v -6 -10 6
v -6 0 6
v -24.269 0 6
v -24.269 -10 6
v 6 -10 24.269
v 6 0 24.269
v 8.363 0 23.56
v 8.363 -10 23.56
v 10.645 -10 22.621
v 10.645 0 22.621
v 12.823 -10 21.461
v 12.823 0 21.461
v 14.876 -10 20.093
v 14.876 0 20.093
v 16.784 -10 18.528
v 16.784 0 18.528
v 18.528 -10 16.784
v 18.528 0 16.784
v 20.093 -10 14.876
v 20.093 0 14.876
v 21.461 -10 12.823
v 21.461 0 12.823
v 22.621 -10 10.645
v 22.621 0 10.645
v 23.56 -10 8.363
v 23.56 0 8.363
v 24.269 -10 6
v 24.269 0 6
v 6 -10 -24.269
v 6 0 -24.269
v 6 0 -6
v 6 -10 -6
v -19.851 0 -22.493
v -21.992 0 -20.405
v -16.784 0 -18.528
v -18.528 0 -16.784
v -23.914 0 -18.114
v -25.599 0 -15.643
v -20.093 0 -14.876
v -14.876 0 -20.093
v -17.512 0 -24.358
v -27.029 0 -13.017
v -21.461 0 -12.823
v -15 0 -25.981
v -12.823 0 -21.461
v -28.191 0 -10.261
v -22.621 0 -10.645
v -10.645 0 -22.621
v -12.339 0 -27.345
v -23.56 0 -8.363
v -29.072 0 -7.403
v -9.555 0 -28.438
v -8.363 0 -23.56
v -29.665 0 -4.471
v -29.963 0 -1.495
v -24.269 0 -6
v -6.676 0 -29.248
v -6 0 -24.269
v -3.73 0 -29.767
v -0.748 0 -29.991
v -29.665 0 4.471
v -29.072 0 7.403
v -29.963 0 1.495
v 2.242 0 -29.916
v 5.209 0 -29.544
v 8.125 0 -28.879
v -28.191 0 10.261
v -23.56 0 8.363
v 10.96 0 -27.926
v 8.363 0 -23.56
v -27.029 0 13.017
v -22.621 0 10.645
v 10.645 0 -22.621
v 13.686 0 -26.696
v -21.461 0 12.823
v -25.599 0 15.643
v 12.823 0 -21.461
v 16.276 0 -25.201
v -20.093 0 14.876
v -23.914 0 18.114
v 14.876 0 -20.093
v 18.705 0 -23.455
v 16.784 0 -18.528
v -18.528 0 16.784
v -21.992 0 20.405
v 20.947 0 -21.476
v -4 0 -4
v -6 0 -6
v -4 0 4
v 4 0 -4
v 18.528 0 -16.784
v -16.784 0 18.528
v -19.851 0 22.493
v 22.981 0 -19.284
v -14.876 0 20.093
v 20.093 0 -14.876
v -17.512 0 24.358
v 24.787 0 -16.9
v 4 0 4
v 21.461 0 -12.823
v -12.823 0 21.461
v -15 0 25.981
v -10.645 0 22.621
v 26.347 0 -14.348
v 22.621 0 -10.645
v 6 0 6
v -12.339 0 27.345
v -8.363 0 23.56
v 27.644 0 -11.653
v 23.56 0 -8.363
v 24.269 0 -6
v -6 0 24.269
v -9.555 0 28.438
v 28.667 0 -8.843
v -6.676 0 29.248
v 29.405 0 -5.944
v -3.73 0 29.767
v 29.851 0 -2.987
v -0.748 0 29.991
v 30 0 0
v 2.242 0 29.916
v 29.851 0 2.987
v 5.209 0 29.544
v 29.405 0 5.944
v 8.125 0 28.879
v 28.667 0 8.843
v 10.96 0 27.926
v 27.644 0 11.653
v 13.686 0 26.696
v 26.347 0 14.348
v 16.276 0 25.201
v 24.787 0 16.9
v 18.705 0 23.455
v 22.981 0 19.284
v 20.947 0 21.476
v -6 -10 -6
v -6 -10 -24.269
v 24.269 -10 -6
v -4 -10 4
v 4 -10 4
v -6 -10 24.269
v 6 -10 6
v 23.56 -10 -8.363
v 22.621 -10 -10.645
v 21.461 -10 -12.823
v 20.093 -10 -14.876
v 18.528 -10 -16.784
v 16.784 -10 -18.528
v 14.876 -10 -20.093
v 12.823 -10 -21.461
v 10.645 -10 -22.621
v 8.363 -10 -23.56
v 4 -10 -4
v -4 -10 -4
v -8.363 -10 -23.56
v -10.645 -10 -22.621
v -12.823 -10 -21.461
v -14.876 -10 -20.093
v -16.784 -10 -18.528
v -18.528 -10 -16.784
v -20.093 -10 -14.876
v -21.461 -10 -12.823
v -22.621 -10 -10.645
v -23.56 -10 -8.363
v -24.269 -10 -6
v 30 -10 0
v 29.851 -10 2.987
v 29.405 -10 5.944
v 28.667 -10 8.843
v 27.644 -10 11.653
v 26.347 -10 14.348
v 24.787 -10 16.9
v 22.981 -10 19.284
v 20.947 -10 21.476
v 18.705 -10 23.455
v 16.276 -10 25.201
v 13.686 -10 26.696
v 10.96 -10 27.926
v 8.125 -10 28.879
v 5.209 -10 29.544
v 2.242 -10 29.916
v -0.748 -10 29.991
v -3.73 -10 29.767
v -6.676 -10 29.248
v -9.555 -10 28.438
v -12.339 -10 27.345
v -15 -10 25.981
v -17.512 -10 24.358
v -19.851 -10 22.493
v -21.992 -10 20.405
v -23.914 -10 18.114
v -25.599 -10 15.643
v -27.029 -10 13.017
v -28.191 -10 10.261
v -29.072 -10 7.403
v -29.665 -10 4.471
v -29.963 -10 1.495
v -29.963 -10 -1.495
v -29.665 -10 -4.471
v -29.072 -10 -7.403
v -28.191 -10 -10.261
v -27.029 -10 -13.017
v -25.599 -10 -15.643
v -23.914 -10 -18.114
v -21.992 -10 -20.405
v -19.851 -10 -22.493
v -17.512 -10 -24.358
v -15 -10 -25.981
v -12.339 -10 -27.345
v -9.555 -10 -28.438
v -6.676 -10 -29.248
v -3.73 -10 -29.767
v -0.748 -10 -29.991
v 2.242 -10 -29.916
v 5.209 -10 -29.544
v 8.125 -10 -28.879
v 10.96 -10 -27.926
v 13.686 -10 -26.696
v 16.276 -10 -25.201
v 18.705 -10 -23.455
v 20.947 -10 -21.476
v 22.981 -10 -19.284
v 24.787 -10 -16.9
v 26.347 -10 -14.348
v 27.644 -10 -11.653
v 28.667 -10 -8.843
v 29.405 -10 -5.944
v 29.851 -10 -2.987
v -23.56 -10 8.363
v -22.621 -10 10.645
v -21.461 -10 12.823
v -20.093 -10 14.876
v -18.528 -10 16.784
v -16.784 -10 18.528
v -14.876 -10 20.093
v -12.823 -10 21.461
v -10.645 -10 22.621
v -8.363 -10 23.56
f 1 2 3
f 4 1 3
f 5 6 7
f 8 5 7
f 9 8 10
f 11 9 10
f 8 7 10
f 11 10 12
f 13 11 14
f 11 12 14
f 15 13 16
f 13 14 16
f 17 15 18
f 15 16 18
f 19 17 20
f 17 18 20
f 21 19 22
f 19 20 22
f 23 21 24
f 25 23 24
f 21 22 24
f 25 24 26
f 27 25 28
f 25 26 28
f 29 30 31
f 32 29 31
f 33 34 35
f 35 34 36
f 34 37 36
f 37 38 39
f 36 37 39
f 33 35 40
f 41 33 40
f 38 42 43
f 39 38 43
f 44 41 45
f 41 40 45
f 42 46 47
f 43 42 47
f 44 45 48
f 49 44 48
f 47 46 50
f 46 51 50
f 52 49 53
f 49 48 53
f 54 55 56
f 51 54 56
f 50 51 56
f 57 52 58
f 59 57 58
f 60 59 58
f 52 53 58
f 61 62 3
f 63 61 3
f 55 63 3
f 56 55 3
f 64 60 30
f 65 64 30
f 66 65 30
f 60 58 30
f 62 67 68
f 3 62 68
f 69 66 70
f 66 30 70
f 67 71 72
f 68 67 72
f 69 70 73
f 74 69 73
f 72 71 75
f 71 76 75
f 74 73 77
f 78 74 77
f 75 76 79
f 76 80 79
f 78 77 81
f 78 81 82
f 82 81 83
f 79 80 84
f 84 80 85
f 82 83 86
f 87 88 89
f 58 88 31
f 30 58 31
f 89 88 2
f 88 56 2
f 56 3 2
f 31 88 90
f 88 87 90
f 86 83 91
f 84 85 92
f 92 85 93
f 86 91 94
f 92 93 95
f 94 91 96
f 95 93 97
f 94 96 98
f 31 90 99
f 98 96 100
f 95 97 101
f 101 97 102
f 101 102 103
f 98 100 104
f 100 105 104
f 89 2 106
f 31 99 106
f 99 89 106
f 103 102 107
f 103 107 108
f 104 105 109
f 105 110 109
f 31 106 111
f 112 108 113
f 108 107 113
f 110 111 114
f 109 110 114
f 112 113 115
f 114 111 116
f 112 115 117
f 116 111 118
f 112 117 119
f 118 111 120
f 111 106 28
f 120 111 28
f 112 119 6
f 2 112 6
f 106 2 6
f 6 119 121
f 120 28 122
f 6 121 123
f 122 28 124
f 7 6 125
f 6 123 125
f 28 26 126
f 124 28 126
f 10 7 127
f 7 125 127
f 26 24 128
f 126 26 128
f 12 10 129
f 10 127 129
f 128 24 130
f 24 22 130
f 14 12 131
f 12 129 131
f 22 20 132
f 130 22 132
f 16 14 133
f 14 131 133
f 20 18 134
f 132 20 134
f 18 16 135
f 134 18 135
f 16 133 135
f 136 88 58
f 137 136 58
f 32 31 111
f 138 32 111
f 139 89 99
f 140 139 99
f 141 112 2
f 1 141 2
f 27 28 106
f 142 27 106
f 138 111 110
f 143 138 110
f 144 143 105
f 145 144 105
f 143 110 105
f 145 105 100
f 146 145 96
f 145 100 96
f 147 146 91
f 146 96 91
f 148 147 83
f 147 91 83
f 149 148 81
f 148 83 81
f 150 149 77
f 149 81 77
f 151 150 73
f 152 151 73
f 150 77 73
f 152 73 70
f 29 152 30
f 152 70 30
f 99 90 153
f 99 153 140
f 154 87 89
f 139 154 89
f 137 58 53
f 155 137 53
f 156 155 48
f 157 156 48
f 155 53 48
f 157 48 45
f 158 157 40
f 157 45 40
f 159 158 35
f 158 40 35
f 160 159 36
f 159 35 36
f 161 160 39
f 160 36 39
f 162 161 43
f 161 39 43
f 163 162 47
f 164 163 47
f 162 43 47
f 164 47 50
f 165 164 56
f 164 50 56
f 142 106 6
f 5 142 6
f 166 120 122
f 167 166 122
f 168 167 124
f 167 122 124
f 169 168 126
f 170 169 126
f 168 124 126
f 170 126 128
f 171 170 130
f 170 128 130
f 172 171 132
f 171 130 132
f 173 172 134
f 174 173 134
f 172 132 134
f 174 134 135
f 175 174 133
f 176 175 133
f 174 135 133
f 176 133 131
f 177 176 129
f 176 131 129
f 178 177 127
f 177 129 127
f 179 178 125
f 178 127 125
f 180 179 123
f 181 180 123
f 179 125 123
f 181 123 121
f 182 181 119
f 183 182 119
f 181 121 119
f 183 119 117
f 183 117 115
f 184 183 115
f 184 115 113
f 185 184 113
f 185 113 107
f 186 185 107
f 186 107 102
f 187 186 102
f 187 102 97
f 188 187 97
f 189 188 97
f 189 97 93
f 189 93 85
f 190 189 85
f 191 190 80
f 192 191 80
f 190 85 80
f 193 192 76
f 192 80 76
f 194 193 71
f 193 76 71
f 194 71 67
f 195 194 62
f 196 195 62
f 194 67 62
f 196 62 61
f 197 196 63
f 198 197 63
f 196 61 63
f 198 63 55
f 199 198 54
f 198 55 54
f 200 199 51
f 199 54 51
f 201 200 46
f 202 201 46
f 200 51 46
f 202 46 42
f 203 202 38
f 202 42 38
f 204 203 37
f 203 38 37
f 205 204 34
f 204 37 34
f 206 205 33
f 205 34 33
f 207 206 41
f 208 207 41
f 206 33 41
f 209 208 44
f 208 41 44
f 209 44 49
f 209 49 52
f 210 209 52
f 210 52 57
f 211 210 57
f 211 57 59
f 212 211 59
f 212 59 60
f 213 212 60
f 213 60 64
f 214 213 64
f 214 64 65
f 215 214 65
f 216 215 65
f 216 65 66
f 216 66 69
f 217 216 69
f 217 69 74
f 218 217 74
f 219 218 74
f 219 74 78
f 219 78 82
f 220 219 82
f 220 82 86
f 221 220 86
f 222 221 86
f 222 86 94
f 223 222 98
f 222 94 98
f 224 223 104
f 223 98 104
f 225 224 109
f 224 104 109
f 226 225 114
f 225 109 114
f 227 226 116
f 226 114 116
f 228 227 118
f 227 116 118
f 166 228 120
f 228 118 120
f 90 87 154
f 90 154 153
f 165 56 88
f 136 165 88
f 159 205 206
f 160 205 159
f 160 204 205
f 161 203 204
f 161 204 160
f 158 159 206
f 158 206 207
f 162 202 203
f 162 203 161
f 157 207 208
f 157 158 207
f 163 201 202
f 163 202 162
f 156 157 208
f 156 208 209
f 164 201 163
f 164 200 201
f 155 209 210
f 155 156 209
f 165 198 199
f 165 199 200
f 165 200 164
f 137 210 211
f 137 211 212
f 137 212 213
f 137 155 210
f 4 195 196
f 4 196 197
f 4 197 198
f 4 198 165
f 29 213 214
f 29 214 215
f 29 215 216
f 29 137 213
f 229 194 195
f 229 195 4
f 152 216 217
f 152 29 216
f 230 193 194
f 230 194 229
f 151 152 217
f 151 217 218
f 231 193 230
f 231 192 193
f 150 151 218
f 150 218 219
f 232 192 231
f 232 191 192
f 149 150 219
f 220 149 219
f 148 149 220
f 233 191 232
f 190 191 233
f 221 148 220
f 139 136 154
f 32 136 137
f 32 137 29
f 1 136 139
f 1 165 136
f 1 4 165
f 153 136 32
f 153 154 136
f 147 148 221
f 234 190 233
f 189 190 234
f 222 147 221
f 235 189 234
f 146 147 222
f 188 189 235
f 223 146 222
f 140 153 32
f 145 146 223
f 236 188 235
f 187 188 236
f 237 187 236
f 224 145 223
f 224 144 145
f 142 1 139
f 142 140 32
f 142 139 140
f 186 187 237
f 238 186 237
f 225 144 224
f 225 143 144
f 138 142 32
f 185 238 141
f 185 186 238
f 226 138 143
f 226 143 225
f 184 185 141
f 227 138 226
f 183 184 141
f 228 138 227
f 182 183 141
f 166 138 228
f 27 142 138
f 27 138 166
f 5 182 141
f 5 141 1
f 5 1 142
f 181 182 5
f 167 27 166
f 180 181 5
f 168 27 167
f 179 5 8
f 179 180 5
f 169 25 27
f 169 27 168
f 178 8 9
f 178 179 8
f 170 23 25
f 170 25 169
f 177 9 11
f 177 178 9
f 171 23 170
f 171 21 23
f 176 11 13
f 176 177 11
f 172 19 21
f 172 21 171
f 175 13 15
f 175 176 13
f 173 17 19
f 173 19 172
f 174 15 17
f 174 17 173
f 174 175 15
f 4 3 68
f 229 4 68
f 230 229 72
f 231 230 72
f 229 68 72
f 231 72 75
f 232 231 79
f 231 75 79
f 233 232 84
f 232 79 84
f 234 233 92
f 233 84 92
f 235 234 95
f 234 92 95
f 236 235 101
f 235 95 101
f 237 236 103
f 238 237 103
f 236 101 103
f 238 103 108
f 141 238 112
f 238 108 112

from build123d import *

# Parameters (mm, degrees)
F0_R     = 30
F0_W     = 8
F0_H     = 8
F1_DEPTH = 10


with BuildPart() as f1:
    # F0 (on Front) → F1 (new body)
    with BuildSketch(Plane.XZ):
        Circle(F0_R)
        with BuildLine():
            Line((-6, -6), (-6, -24.269322))
            ThreePointArc((-6, -24.269322), (-17.67767, -17.67767), (-24.269322, -6))
            Line((-24.269322, -6), (-6, -6))
        make_face(mode=Mode.SUBTRACT)
        with BuildLine():
            Line((6, -6), (24.269322, -6))
            ThreePointArc((24.269322, -6), (17.67767, -17.67767), (6, -24.269322))
            Line((6, -24.269322), (6, -6))
        make_face(mode=Mode.SUBTRACT)
        with BuildLine():
            Line((-6, 24.269322), (-6, 6))
            Line((-6, 6), (-24.269322, 6))
            ThreePointArc((-24.269322, 6), (-17.67767, 17.67767), (-6, 24.269322))
        make_face(mode=Mode.SUBTRACT)
        Rectangle(F0_W, F0_H, mode=Mode.SUBTRACT)
        with BuildLine():
            ThreePointArc((6, 24.269322), (17.67767, 17.67767), (24.269322, 6))
            Line((24.269322, 6), (6, 6))
            Line((6, 6), (6, 24.269322))
        make_face(mode=Mode.SUBTRACT)
    extrude(amount=F1_DEPTH)


solid = f1.part
